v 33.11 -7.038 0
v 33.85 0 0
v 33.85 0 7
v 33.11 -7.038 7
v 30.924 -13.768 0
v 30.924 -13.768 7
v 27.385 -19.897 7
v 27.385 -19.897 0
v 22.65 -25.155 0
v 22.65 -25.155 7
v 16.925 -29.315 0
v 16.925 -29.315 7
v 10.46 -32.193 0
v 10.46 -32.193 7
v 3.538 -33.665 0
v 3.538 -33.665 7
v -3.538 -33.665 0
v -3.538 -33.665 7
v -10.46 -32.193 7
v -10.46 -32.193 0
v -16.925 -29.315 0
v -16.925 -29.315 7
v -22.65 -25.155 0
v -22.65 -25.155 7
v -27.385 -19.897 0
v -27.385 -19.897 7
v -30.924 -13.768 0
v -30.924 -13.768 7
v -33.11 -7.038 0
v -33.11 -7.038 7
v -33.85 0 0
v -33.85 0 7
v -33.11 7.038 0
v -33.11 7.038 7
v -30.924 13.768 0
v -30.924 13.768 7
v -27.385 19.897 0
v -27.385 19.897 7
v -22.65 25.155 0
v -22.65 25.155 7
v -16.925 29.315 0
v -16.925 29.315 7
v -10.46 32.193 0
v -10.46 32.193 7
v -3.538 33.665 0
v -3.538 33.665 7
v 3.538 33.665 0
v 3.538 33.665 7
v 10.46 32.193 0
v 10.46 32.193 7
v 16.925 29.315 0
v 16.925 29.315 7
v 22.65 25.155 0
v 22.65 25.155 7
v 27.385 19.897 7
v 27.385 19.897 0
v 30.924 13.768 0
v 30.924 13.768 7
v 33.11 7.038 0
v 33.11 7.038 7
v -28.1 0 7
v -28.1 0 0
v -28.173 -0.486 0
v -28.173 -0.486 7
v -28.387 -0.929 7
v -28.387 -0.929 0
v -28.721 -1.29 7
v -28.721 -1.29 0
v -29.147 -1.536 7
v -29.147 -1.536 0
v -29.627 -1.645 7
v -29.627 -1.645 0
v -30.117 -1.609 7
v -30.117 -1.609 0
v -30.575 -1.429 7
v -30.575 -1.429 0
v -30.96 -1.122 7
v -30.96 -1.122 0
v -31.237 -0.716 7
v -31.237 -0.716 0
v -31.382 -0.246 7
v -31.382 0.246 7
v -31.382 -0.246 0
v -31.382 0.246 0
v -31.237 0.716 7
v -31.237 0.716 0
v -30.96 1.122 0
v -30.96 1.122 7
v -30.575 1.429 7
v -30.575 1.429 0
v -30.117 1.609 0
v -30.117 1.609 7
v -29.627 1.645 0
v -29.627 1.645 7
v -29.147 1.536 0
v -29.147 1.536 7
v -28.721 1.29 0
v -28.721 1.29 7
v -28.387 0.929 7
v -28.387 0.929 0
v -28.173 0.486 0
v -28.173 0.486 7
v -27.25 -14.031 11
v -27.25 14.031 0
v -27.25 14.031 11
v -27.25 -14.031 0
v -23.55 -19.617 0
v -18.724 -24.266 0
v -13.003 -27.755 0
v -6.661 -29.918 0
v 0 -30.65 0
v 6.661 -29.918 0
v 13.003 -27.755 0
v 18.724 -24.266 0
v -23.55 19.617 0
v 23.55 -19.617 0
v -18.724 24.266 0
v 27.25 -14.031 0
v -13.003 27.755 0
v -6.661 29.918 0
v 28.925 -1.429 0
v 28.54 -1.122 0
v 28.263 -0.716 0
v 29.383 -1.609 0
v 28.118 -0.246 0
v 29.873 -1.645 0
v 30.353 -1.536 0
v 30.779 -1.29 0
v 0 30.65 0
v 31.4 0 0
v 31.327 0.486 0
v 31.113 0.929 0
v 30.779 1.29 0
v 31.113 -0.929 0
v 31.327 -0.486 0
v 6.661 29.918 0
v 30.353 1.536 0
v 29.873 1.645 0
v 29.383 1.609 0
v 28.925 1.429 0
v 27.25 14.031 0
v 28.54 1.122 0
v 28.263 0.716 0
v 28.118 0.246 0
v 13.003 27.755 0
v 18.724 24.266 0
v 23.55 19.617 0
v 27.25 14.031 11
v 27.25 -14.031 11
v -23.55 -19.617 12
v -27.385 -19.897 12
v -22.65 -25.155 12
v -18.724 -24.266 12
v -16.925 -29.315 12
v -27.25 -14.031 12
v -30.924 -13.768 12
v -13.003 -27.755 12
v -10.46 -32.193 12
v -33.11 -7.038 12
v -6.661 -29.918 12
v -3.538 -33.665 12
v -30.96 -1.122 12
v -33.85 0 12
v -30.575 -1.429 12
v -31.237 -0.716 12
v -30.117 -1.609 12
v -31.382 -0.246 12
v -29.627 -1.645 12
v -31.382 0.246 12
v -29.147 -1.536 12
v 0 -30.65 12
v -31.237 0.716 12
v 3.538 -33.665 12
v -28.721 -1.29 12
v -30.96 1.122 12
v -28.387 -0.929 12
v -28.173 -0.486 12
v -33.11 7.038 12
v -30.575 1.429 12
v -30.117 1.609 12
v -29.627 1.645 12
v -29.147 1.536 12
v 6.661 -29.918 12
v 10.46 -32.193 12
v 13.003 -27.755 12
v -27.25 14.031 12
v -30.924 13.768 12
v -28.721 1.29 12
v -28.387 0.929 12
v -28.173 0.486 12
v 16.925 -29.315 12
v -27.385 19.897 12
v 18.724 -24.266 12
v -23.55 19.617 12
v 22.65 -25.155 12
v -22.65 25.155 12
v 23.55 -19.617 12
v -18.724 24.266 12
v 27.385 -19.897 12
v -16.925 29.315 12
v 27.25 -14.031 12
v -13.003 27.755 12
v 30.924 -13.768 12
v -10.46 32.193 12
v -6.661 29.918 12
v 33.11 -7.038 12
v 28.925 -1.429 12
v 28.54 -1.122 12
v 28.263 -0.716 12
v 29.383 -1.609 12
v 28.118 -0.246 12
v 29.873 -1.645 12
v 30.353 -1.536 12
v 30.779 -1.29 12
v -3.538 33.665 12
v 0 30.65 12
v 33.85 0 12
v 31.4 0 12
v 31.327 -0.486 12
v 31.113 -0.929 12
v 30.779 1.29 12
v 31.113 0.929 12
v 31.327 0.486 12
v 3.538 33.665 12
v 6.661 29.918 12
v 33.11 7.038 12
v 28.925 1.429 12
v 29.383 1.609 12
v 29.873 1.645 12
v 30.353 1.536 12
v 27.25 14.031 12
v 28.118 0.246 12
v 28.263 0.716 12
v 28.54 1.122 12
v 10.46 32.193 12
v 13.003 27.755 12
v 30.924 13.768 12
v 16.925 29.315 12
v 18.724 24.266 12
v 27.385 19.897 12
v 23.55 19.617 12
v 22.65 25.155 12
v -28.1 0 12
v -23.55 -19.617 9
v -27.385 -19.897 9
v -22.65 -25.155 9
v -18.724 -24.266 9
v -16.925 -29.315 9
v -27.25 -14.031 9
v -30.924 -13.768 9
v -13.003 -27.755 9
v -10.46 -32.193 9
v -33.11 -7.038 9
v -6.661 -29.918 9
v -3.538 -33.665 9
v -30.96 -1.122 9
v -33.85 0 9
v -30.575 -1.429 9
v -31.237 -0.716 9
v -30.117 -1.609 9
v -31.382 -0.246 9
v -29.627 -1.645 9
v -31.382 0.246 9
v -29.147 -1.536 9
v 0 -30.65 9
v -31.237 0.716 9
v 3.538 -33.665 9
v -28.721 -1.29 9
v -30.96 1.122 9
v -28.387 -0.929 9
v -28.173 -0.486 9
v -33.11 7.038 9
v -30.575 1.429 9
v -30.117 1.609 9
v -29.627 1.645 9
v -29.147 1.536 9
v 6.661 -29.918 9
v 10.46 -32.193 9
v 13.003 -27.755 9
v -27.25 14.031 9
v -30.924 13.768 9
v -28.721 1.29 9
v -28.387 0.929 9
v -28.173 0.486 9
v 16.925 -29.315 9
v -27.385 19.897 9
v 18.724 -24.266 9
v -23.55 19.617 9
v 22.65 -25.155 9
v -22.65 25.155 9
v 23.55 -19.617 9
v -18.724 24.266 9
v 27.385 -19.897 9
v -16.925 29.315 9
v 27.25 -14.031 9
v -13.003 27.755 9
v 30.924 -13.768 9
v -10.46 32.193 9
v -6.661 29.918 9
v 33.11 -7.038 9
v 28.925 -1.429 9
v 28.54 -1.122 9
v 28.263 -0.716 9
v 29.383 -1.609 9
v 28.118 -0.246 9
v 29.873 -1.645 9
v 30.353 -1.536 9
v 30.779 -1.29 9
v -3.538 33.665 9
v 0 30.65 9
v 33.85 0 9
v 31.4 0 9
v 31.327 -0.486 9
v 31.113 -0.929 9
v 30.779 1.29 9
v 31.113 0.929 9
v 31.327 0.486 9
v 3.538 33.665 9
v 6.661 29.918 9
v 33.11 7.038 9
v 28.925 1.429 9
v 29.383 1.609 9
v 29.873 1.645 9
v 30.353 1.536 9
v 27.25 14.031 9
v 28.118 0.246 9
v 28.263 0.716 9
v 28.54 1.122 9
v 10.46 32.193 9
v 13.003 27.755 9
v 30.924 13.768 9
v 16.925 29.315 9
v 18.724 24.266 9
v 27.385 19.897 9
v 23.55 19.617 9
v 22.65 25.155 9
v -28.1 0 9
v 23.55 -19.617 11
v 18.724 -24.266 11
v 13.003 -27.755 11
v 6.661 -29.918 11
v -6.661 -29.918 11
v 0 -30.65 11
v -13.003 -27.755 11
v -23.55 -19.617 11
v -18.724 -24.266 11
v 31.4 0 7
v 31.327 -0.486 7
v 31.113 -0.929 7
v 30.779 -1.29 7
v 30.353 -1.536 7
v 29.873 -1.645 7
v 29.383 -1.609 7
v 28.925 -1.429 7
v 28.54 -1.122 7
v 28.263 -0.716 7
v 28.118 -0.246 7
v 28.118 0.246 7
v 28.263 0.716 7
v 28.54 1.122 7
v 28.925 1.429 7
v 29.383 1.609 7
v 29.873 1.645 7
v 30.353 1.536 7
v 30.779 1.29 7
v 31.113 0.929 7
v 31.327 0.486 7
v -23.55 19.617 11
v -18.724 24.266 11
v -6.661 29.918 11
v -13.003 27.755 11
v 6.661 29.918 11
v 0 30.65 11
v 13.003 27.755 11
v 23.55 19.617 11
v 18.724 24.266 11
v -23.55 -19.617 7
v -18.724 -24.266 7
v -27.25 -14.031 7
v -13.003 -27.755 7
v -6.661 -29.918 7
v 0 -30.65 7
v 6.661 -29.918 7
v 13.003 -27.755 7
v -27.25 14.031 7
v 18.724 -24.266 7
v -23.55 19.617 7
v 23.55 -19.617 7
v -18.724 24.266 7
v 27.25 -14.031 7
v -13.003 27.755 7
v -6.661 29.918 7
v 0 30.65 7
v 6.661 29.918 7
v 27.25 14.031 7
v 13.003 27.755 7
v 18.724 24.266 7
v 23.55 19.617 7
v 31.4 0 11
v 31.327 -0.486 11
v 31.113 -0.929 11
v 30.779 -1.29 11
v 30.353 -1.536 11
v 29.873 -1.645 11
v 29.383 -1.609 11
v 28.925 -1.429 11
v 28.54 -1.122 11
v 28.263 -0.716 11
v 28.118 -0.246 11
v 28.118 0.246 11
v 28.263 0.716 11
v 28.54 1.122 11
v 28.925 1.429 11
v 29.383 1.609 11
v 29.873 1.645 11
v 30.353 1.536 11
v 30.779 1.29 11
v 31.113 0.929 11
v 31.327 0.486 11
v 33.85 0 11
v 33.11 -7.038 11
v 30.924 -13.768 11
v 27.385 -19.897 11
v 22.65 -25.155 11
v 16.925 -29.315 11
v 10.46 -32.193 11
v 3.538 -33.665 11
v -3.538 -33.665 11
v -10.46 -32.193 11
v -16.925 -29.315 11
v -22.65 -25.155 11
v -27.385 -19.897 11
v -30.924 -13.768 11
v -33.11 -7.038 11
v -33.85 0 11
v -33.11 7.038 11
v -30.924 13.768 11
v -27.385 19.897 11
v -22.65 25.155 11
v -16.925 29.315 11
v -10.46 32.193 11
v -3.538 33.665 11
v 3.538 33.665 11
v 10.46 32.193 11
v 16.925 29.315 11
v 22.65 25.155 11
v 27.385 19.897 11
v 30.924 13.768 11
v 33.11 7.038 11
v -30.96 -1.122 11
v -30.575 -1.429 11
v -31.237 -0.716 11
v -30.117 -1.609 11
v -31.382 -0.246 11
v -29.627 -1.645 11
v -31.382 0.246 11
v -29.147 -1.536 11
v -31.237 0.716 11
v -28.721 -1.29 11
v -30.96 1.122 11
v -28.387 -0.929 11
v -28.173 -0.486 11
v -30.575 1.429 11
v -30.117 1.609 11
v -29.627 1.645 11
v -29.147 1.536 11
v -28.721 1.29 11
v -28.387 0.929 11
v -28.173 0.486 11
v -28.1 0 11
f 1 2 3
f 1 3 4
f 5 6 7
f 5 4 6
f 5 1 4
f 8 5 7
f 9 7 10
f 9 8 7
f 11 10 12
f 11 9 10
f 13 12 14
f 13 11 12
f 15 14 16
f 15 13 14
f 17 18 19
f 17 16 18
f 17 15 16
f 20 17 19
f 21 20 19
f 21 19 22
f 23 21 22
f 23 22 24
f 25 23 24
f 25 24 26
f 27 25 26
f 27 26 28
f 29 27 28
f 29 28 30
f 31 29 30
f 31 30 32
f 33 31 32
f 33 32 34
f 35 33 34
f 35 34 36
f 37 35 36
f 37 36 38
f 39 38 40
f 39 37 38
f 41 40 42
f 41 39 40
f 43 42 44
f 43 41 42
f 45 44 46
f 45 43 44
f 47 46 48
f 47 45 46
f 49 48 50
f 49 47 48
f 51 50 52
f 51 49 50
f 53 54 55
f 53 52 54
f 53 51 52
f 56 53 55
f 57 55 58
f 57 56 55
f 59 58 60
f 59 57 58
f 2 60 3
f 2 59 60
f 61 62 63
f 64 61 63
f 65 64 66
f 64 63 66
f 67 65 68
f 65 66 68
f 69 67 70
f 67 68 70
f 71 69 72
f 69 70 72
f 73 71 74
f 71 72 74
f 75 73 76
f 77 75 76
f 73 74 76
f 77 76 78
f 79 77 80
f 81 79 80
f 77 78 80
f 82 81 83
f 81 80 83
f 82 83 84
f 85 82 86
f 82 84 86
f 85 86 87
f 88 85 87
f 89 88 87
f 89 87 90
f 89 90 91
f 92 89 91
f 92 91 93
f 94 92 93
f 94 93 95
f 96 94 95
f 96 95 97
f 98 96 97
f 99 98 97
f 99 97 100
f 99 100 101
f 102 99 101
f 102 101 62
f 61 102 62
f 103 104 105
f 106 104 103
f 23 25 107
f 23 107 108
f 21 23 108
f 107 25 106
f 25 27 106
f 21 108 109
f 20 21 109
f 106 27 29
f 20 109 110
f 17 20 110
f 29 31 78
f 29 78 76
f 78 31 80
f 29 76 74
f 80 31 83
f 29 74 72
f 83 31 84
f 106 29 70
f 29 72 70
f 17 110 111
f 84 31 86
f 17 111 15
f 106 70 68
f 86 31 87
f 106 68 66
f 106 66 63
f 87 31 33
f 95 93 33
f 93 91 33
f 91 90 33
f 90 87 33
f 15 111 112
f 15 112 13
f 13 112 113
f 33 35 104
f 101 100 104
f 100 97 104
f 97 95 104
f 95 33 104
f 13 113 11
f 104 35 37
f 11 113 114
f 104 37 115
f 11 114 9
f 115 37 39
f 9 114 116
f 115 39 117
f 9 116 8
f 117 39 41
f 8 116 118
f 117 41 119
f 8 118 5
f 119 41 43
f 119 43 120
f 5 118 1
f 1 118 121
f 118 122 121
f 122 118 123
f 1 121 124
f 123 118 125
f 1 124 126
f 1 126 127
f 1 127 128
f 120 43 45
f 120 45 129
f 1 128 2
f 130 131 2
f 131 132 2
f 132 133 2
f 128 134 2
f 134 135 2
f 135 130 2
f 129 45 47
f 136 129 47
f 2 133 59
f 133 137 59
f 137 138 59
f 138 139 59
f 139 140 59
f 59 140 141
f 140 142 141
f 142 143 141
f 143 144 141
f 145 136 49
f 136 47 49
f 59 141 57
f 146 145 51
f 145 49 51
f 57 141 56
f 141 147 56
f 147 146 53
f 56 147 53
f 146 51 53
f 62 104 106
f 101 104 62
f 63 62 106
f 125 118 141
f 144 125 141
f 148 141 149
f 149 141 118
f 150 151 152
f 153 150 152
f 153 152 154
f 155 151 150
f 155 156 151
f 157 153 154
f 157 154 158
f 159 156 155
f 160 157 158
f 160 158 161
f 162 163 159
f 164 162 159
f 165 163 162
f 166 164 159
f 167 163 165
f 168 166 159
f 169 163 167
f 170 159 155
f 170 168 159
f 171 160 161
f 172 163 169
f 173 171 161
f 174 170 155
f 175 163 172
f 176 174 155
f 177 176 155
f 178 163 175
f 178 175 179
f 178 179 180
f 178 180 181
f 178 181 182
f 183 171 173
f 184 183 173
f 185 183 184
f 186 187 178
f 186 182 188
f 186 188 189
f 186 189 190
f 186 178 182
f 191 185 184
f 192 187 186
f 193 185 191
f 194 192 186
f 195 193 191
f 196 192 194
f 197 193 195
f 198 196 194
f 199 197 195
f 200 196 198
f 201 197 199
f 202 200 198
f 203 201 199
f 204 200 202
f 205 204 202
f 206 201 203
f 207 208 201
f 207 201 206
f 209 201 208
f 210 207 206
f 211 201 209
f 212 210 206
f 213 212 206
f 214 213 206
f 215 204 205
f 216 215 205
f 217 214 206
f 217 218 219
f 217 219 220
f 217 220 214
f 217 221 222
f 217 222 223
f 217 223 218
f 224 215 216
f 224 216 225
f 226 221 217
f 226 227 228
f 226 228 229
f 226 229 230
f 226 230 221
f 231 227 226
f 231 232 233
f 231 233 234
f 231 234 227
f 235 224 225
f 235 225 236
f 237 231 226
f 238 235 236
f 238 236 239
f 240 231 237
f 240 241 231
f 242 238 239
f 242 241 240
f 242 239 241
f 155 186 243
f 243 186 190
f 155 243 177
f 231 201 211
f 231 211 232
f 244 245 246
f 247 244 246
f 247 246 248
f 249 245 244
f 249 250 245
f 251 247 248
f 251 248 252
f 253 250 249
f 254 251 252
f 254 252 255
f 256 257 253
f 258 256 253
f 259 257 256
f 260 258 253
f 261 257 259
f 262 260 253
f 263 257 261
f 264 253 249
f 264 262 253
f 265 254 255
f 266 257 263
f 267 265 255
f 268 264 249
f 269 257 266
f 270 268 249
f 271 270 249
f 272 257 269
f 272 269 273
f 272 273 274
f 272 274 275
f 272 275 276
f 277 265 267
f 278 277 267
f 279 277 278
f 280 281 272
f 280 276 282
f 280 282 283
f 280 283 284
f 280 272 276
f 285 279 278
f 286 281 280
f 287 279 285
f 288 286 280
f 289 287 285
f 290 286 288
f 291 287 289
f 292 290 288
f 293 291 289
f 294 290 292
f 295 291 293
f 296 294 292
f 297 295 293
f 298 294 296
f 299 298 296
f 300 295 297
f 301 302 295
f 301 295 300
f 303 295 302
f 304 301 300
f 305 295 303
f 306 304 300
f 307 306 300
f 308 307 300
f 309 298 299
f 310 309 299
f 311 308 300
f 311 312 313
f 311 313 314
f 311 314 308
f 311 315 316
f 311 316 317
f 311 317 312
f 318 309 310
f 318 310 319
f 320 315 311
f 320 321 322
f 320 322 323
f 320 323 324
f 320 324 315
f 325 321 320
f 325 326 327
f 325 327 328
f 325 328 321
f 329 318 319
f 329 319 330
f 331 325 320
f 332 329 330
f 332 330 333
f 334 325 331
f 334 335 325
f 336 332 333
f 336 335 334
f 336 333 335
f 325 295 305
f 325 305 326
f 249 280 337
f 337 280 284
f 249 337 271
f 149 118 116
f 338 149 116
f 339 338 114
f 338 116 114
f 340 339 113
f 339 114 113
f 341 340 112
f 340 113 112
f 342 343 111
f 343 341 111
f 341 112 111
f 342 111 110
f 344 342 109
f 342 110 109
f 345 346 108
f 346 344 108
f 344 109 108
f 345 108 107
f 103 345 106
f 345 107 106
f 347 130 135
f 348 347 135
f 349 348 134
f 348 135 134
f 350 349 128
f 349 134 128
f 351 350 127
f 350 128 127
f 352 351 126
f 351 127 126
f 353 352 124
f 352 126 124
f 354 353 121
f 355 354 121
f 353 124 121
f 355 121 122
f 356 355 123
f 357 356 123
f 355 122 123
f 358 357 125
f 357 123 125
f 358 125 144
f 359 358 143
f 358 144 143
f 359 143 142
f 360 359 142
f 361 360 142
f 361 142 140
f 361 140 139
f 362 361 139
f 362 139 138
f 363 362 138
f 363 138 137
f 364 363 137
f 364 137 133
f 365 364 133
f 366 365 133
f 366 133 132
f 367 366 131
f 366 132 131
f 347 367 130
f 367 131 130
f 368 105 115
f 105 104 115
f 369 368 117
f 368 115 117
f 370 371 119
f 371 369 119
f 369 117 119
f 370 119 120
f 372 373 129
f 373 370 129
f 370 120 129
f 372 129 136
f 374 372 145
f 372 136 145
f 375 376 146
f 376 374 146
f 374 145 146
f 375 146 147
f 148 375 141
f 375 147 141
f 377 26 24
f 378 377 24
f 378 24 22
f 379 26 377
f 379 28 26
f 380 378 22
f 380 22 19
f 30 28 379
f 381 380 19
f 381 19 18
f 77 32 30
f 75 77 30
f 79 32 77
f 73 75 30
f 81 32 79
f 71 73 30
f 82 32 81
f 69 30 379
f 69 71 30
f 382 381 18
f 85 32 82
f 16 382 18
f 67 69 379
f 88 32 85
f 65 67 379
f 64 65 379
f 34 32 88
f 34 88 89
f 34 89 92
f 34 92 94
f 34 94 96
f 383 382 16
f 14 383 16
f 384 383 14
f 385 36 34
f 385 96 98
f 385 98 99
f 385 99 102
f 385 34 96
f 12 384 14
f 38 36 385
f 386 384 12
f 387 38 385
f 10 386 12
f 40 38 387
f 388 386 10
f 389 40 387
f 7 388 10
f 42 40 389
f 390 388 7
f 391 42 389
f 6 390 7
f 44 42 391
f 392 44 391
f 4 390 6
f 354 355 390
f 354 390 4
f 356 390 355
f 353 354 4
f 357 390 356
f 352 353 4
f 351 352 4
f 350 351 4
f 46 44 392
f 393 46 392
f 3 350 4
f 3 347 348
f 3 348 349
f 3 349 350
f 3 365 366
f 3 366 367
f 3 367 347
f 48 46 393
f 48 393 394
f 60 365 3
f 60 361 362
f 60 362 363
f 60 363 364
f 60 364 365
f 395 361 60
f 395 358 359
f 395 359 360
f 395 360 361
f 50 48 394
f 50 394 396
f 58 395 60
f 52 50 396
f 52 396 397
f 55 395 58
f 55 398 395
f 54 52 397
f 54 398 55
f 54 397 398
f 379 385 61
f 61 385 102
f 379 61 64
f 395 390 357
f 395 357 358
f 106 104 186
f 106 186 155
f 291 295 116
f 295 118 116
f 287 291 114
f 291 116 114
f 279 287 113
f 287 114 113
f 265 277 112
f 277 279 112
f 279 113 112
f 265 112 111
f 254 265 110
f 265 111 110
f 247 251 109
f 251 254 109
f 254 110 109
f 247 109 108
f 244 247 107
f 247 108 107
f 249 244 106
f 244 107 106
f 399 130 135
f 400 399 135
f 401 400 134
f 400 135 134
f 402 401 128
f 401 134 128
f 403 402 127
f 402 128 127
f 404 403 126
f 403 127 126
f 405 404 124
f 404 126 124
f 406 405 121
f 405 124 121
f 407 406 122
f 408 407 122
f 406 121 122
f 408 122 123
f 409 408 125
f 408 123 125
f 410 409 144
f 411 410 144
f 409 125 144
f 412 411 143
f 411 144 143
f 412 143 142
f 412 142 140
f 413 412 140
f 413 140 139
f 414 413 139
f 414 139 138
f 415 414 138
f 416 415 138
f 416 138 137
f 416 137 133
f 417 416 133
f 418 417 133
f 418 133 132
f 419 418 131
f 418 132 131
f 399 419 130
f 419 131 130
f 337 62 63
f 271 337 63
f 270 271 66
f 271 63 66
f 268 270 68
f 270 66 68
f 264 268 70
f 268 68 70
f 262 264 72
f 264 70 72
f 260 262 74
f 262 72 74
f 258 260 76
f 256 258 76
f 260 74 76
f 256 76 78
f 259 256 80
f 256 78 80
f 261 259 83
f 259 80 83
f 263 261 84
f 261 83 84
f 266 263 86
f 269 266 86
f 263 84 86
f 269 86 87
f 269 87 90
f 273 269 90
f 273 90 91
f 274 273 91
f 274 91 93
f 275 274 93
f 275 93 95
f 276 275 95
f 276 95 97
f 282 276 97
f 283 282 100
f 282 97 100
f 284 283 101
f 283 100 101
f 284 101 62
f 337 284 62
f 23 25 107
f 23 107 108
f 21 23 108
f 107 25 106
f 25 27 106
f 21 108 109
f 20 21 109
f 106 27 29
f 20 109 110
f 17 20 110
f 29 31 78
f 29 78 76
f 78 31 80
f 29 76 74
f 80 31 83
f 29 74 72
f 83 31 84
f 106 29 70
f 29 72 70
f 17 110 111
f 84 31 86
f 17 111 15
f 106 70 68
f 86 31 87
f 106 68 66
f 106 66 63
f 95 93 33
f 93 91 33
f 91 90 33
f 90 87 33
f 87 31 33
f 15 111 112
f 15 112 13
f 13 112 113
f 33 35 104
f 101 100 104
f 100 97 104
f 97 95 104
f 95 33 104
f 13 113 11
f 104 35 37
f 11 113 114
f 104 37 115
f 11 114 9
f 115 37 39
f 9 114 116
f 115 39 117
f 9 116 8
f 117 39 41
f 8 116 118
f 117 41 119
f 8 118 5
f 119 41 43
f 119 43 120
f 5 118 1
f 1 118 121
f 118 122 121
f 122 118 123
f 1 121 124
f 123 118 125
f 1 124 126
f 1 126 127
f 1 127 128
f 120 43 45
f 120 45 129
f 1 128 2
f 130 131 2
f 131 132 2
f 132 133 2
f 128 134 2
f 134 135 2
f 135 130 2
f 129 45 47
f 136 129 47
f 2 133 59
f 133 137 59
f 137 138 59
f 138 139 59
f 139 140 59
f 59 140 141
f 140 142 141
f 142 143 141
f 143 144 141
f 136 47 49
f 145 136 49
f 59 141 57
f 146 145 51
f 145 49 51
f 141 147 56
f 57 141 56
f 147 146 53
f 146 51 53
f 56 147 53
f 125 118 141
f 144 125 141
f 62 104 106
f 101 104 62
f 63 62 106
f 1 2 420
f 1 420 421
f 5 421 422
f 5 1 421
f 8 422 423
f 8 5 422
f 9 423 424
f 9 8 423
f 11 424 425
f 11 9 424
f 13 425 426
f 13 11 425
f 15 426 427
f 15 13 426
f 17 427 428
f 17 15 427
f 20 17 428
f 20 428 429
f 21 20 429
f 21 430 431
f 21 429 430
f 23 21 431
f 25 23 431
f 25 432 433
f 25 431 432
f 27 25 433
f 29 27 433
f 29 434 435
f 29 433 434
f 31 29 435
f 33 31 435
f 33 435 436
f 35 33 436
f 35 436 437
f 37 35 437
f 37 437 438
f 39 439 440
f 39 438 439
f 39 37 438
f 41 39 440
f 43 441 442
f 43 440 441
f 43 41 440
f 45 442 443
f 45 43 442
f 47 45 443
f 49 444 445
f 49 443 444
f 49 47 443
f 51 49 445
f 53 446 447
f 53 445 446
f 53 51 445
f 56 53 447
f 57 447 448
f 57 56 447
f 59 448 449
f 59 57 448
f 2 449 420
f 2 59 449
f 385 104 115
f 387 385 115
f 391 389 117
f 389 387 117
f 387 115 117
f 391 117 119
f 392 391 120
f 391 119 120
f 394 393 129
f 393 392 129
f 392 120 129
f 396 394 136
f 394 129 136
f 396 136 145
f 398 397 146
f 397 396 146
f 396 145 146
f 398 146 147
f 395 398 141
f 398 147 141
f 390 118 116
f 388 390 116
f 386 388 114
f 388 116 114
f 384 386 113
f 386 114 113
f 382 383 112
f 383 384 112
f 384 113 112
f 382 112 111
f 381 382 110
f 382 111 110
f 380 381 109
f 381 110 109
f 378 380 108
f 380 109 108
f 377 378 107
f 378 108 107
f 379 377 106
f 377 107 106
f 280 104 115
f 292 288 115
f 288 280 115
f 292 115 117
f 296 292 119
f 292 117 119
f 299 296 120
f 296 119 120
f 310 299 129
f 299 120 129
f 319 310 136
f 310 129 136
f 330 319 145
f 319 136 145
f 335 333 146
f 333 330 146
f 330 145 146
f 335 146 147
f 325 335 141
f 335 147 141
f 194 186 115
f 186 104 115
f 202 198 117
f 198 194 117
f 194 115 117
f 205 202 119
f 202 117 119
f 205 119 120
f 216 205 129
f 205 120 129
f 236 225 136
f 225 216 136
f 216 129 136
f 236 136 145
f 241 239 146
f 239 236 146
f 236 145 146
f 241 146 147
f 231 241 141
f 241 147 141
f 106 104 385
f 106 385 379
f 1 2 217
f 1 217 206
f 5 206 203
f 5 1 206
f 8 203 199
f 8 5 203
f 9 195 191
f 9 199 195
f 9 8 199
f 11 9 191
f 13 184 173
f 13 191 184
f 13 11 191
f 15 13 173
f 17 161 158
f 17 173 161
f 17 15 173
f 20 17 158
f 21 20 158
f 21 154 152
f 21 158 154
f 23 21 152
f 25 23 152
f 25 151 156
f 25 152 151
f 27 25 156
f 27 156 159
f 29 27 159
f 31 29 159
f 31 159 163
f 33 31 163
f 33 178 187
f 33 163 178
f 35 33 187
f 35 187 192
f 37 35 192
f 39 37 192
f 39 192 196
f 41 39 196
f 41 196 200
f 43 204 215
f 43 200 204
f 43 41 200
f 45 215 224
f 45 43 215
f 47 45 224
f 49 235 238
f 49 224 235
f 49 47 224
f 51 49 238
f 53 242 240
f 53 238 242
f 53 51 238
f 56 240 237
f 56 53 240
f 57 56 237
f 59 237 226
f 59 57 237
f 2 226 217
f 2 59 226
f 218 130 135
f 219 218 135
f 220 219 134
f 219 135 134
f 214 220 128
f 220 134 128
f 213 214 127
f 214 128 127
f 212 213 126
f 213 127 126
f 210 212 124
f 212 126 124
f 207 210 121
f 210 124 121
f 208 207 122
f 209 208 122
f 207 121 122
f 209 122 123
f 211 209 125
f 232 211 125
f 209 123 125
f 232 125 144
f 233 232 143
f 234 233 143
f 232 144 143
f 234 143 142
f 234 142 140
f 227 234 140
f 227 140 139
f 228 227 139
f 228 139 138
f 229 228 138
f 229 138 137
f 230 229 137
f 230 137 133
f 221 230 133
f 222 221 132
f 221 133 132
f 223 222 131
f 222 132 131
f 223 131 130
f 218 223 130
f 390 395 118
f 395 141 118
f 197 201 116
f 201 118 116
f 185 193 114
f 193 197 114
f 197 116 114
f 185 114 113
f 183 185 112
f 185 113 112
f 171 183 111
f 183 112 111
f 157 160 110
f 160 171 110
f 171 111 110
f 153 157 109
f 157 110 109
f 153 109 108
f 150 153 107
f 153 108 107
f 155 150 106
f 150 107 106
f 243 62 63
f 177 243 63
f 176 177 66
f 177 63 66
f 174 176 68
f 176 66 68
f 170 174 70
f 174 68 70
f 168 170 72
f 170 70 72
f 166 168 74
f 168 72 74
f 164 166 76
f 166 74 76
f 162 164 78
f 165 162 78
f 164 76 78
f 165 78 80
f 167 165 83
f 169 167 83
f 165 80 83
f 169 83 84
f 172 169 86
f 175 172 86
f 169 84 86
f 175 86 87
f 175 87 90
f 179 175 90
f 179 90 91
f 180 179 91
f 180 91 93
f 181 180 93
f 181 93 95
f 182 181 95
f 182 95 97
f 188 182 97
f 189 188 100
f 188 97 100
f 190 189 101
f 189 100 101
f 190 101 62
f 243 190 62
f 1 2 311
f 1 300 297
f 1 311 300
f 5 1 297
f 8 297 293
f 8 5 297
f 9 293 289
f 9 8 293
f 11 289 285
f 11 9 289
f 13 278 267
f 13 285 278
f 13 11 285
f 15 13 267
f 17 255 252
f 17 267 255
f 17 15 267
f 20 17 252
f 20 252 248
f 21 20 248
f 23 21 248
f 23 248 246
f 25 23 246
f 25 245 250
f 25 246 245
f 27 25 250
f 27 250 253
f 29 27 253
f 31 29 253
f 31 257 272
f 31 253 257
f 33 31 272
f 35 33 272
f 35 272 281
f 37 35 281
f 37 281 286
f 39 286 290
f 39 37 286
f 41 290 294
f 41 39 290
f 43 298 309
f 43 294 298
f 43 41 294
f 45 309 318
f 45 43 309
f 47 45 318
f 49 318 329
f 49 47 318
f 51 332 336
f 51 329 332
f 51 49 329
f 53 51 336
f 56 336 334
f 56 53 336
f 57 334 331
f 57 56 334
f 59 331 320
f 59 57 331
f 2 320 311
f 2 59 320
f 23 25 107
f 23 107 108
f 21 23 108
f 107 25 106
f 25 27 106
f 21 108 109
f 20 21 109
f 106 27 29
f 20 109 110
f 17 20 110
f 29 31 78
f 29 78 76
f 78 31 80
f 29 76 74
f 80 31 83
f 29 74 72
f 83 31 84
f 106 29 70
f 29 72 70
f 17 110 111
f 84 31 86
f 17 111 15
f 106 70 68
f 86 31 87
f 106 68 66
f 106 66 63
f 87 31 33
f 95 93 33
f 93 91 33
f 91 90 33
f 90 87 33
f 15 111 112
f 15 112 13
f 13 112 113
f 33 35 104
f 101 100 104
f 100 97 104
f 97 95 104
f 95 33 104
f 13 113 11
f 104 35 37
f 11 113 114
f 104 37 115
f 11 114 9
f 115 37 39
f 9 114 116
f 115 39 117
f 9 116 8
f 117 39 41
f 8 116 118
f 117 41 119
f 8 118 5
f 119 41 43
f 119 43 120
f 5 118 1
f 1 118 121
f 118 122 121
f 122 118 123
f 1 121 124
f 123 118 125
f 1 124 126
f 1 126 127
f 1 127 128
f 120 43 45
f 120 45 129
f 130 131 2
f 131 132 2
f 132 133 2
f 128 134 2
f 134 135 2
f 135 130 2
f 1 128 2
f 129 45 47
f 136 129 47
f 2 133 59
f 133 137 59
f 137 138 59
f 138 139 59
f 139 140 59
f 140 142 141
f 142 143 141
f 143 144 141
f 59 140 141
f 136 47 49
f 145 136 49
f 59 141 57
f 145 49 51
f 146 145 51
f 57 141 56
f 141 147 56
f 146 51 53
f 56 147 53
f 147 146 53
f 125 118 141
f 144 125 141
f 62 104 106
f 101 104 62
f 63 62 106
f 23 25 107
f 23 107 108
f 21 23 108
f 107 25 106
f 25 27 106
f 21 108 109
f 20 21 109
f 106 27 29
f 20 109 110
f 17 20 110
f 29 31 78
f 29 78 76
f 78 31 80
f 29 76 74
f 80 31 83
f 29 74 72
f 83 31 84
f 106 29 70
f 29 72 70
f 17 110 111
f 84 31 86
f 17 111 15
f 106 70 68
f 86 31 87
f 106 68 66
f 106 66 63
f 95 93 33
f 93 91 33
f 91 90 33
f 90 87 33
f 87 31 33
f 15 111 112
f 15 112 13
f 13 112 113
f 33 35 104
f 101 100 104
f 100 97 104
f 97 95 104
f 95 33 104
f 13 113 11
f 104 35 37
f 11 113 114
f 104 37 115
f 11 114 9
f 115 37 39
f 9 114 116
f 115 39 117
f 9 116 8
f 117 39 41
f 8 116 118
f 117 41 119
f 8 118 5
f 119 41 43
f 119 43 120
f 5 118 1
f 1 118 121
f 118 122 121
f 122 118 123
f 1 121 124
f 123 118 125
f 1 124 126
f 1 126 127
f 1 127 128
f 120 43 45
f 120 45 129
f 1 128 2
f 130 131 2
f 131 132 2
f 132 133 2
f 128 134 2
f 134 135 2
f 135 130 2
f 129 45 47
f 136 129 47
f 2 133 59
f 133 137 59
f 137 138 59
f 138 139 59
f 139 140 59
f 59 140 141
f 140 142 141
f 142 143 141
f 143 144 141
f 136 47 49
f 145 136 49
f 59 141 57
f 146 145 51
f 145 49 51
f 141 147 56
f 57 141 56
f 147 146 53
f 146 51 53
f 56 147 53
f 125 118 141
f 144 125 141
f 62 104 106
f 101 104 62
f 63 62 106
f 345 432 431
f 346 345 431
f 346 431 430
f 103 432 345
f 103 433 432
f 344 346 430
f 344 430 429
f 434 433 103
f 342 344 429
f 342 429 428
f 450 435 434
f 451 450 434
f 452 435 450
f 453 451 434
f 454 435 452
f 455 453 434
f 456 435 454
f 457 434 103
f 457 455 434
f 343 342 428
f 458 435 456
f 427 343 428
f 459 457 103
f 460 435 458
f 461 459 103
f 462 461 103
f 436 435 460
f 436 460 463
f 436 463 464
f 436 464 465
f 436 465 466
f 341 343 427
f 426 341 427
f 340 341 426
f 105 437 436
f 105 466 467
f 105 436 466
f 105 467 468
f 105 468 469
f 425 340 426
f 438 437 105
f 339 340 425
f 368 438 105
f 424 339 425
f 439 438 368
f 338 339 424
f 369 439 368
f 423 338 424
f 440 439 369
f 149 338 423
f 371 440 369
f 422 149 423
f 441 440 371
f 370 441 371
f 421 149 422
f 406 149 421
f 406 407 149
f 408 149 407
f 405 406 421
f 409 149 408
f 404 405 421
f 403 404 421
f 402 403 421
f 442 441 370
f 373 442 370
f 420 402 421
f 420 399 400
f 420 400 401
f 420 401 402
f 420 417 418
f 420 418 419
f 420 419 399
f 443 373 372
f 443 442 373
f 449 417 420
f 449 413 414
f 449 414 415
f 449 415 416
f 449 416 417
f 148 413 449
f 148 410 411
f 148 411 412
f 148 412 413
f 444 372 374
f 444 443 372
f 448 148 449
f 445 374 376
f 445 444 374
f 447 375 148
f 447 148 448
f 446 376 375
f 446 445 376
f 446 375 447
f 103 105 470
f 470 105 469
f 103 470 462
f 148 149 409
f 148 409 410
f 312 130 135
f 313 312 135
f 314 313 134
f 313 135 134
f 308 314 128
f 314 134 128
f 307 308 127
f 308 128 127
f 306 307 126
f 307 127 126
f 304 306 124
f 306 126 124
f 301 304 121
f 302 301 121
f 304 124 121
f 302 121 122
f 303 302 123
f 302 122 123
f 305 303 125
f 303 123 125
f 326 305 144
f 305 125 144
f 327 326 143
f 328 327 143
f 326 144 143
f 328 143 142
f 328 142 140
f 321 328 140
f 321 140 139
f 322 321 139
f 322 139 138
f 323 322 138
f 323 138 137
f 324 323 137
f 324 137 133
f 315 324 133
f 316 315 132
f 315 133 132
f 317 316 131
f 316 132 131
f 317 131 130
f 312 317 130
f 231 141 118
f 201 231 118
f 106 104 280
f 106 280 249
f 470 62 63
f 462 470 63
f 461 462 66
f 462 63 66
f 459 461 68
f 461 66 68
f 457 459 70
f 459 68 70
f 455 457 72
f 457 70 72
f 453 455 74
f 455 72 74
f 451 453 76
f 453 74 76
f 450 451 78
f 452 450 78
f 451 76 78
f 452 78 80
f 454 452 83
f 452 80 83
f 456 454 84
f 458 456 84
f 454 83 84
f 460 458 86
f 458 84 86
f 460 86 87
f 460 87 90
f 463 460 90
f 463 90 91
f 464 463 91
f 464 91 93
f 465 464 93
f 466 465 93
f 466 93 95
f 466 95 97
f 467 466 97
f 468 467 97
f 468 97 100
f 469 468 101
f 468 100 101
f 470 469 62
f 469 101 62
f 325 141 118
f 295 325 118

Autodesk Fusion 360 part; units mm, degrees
sketch "Base" plane through (0, 0, 0) normal (0, 0, 1) x (1, 0, 0) in component "Spacer (7mm)"
  circle A0 centre (0, 0) radius 33.85
  circle A1 centre (0, 0) radius 30.65
  circle A2 centre (-29.75, 0) radius 1.65
  circle A3 centre (29.75, 0) radius 1.65
  line L0 (-27.25, 14.0307) -> (-27.25, -14.0307)
  line L1 (27.25, 14.0307) -> (27.25, -14.0307)
  dimension "d1" = 67.7
  dimension "d2" = 61.3
  dimension "d3" = 3.3
  dimension "d4" = 29.75
  dimension "d5" = 3.3
  dimension "d6" = 29.75
  dimension "d7" = 27.25
  dimension "d8" = 27.25
extrude "Extrude1" add sketch "Base" along normal blind 7 contours A0 | A1 A3 L1 | A1 A2 L0 makes body 1 in component "Spacer (7mm)"
sketch "Base (2)" plane through (0, 0, 0) normal (0, 0, 1) x (1, 0, 0) in component "Spacer (9mm)"
  circle A0 centre (0, 0) radius 33.85
  circle A1 centre (0, 0) radius 30.65
  circle A2 centre (-29.75, 0) radius 1.65
  circle A3 centre (29.75, 0) radius 1.65
  line L0 (-27.25, 14.0307) -> (-27.25, -14.0307)
  line L1 (27.25, 14.0307) -> (27.25, -14.0307)
  dimension "d1_1" = 67.7
  dimension "d2_1" = 61.3
  dimension "d3_1" = 3.3
  dimension "d4_1" = 29.75
  dimension "d5_1" = 3.3
  dimension "d6_1" = 29.75
  dimension "d7_1" = 27.25
  dimension "d8_1" = 27.25
extrude "Extrude1'" add sketch "Base (2)" along normal blind 9 separate body contours A0 | A1 A3 L1 | A1 A2 L0 makes body 2 in component "Spacer (9mm)"
sketch "Base (3)" plane through (0, 0, 0) normal (0, 0, 1) x (1, 0, 0) in component "Spacer (11mm)"
  circle A0 centre (0, 0) radius 33.85
  circle A1 centre (0, 0) radius 30.65
  circle A2 centre (-29.75, 0) radius 1.65
  circle A3 centre (29.75, 0) radius 1.65
  line L0 (-27.25, 14.0307) -> (-27.25, -14.0307)
  line L1 (27.25, 14.0307) -> (27.25, -14.0307)
  dimension "d1_1_1" = 67.7
  dimension "d2_1_1" = 61.3
  dimension "d3_1_1" = 3.3
  dimension "d4_1_1" = 29.75
  dimension "d5_1_1" = 3.3
  dimension "d6_1_1" = 29.75
  dimension "d7_1_1" = 27.25
  dimension "d8_1_1" = 27.25
extrude "Extrude1''" add sketch "Base (3)" along normal blind 11 separate body contours A0 | A1 A3 L1 | A1 A2 L0 makes body 3 in component "Spacer (11mm)"
sketch "Base (4)" plane through (0, 0, 0) normal (0, 0, 1) x (1, 0, 0) in component "Spacer (12mm)"
  circle A0 centre (0, 0) radius 33.85
  circle A1 centre (0, 0) radius 30.65
  circle A2 centre (-29.75, 0) radius 1.65
  circle A3 centre (29.75, 0) radius 1.65
  line L0 (-27.25, 14.0307) -> (-27.25, -14.0307)
  line L1 (27.25, 14.0307) -> (27.25, -14.0307)
  dimension "d1_1_1_1" = 67.7
  dimension "d2_1_1_1" = 61.3
  dimension "d3_1_1_1" = 3.3
  dimension "d4_1_1_1" = 29.75
  dimension "d5_1_1_1" = 3.3
  dimension "d6_1_1_1" = 29.75
  dimension "d7_1_1_1" = 27.25
  dimension "d8_1_1_1" = 27.25
extrude "Extrude1'''" add sketch "Base (4)" along normal blind 12 separate body contours A0 | A1 A3 L1 | A1 A2 L0 makes body 4 in component "Spacer (12mm)"
component "Electrical Box Spacers" placed x (1, 0, 0) y (0, 1, 0) z (0, 0, 1) at (0, 0, 0)
component "Spacer (7mm)" placed x (1, 0, 0) y (0, 1, 0) z (0, 0, 1) at (0, 0, 0) in component "Electrical Box Spacers"
component "Spacer (9mm)" placed x (1, 0, 0) y (0, 1, 0) z (0, 0, 1) at (0, 0, 0) in component "Electrical Box Spacers"
component "Spacer (11mm)" placed x (1, 0, 0) y (0, 1, 0) z (0, 0, 1) at (0, 0, 0) in component "Electrical Box Spacers"
component "Spacer (12mm)" placed x (1, 0, 0) y (0, 1, 0) z (0, 0, 1) at (0, 0, 0) in component "Electrical Box Spacers"
